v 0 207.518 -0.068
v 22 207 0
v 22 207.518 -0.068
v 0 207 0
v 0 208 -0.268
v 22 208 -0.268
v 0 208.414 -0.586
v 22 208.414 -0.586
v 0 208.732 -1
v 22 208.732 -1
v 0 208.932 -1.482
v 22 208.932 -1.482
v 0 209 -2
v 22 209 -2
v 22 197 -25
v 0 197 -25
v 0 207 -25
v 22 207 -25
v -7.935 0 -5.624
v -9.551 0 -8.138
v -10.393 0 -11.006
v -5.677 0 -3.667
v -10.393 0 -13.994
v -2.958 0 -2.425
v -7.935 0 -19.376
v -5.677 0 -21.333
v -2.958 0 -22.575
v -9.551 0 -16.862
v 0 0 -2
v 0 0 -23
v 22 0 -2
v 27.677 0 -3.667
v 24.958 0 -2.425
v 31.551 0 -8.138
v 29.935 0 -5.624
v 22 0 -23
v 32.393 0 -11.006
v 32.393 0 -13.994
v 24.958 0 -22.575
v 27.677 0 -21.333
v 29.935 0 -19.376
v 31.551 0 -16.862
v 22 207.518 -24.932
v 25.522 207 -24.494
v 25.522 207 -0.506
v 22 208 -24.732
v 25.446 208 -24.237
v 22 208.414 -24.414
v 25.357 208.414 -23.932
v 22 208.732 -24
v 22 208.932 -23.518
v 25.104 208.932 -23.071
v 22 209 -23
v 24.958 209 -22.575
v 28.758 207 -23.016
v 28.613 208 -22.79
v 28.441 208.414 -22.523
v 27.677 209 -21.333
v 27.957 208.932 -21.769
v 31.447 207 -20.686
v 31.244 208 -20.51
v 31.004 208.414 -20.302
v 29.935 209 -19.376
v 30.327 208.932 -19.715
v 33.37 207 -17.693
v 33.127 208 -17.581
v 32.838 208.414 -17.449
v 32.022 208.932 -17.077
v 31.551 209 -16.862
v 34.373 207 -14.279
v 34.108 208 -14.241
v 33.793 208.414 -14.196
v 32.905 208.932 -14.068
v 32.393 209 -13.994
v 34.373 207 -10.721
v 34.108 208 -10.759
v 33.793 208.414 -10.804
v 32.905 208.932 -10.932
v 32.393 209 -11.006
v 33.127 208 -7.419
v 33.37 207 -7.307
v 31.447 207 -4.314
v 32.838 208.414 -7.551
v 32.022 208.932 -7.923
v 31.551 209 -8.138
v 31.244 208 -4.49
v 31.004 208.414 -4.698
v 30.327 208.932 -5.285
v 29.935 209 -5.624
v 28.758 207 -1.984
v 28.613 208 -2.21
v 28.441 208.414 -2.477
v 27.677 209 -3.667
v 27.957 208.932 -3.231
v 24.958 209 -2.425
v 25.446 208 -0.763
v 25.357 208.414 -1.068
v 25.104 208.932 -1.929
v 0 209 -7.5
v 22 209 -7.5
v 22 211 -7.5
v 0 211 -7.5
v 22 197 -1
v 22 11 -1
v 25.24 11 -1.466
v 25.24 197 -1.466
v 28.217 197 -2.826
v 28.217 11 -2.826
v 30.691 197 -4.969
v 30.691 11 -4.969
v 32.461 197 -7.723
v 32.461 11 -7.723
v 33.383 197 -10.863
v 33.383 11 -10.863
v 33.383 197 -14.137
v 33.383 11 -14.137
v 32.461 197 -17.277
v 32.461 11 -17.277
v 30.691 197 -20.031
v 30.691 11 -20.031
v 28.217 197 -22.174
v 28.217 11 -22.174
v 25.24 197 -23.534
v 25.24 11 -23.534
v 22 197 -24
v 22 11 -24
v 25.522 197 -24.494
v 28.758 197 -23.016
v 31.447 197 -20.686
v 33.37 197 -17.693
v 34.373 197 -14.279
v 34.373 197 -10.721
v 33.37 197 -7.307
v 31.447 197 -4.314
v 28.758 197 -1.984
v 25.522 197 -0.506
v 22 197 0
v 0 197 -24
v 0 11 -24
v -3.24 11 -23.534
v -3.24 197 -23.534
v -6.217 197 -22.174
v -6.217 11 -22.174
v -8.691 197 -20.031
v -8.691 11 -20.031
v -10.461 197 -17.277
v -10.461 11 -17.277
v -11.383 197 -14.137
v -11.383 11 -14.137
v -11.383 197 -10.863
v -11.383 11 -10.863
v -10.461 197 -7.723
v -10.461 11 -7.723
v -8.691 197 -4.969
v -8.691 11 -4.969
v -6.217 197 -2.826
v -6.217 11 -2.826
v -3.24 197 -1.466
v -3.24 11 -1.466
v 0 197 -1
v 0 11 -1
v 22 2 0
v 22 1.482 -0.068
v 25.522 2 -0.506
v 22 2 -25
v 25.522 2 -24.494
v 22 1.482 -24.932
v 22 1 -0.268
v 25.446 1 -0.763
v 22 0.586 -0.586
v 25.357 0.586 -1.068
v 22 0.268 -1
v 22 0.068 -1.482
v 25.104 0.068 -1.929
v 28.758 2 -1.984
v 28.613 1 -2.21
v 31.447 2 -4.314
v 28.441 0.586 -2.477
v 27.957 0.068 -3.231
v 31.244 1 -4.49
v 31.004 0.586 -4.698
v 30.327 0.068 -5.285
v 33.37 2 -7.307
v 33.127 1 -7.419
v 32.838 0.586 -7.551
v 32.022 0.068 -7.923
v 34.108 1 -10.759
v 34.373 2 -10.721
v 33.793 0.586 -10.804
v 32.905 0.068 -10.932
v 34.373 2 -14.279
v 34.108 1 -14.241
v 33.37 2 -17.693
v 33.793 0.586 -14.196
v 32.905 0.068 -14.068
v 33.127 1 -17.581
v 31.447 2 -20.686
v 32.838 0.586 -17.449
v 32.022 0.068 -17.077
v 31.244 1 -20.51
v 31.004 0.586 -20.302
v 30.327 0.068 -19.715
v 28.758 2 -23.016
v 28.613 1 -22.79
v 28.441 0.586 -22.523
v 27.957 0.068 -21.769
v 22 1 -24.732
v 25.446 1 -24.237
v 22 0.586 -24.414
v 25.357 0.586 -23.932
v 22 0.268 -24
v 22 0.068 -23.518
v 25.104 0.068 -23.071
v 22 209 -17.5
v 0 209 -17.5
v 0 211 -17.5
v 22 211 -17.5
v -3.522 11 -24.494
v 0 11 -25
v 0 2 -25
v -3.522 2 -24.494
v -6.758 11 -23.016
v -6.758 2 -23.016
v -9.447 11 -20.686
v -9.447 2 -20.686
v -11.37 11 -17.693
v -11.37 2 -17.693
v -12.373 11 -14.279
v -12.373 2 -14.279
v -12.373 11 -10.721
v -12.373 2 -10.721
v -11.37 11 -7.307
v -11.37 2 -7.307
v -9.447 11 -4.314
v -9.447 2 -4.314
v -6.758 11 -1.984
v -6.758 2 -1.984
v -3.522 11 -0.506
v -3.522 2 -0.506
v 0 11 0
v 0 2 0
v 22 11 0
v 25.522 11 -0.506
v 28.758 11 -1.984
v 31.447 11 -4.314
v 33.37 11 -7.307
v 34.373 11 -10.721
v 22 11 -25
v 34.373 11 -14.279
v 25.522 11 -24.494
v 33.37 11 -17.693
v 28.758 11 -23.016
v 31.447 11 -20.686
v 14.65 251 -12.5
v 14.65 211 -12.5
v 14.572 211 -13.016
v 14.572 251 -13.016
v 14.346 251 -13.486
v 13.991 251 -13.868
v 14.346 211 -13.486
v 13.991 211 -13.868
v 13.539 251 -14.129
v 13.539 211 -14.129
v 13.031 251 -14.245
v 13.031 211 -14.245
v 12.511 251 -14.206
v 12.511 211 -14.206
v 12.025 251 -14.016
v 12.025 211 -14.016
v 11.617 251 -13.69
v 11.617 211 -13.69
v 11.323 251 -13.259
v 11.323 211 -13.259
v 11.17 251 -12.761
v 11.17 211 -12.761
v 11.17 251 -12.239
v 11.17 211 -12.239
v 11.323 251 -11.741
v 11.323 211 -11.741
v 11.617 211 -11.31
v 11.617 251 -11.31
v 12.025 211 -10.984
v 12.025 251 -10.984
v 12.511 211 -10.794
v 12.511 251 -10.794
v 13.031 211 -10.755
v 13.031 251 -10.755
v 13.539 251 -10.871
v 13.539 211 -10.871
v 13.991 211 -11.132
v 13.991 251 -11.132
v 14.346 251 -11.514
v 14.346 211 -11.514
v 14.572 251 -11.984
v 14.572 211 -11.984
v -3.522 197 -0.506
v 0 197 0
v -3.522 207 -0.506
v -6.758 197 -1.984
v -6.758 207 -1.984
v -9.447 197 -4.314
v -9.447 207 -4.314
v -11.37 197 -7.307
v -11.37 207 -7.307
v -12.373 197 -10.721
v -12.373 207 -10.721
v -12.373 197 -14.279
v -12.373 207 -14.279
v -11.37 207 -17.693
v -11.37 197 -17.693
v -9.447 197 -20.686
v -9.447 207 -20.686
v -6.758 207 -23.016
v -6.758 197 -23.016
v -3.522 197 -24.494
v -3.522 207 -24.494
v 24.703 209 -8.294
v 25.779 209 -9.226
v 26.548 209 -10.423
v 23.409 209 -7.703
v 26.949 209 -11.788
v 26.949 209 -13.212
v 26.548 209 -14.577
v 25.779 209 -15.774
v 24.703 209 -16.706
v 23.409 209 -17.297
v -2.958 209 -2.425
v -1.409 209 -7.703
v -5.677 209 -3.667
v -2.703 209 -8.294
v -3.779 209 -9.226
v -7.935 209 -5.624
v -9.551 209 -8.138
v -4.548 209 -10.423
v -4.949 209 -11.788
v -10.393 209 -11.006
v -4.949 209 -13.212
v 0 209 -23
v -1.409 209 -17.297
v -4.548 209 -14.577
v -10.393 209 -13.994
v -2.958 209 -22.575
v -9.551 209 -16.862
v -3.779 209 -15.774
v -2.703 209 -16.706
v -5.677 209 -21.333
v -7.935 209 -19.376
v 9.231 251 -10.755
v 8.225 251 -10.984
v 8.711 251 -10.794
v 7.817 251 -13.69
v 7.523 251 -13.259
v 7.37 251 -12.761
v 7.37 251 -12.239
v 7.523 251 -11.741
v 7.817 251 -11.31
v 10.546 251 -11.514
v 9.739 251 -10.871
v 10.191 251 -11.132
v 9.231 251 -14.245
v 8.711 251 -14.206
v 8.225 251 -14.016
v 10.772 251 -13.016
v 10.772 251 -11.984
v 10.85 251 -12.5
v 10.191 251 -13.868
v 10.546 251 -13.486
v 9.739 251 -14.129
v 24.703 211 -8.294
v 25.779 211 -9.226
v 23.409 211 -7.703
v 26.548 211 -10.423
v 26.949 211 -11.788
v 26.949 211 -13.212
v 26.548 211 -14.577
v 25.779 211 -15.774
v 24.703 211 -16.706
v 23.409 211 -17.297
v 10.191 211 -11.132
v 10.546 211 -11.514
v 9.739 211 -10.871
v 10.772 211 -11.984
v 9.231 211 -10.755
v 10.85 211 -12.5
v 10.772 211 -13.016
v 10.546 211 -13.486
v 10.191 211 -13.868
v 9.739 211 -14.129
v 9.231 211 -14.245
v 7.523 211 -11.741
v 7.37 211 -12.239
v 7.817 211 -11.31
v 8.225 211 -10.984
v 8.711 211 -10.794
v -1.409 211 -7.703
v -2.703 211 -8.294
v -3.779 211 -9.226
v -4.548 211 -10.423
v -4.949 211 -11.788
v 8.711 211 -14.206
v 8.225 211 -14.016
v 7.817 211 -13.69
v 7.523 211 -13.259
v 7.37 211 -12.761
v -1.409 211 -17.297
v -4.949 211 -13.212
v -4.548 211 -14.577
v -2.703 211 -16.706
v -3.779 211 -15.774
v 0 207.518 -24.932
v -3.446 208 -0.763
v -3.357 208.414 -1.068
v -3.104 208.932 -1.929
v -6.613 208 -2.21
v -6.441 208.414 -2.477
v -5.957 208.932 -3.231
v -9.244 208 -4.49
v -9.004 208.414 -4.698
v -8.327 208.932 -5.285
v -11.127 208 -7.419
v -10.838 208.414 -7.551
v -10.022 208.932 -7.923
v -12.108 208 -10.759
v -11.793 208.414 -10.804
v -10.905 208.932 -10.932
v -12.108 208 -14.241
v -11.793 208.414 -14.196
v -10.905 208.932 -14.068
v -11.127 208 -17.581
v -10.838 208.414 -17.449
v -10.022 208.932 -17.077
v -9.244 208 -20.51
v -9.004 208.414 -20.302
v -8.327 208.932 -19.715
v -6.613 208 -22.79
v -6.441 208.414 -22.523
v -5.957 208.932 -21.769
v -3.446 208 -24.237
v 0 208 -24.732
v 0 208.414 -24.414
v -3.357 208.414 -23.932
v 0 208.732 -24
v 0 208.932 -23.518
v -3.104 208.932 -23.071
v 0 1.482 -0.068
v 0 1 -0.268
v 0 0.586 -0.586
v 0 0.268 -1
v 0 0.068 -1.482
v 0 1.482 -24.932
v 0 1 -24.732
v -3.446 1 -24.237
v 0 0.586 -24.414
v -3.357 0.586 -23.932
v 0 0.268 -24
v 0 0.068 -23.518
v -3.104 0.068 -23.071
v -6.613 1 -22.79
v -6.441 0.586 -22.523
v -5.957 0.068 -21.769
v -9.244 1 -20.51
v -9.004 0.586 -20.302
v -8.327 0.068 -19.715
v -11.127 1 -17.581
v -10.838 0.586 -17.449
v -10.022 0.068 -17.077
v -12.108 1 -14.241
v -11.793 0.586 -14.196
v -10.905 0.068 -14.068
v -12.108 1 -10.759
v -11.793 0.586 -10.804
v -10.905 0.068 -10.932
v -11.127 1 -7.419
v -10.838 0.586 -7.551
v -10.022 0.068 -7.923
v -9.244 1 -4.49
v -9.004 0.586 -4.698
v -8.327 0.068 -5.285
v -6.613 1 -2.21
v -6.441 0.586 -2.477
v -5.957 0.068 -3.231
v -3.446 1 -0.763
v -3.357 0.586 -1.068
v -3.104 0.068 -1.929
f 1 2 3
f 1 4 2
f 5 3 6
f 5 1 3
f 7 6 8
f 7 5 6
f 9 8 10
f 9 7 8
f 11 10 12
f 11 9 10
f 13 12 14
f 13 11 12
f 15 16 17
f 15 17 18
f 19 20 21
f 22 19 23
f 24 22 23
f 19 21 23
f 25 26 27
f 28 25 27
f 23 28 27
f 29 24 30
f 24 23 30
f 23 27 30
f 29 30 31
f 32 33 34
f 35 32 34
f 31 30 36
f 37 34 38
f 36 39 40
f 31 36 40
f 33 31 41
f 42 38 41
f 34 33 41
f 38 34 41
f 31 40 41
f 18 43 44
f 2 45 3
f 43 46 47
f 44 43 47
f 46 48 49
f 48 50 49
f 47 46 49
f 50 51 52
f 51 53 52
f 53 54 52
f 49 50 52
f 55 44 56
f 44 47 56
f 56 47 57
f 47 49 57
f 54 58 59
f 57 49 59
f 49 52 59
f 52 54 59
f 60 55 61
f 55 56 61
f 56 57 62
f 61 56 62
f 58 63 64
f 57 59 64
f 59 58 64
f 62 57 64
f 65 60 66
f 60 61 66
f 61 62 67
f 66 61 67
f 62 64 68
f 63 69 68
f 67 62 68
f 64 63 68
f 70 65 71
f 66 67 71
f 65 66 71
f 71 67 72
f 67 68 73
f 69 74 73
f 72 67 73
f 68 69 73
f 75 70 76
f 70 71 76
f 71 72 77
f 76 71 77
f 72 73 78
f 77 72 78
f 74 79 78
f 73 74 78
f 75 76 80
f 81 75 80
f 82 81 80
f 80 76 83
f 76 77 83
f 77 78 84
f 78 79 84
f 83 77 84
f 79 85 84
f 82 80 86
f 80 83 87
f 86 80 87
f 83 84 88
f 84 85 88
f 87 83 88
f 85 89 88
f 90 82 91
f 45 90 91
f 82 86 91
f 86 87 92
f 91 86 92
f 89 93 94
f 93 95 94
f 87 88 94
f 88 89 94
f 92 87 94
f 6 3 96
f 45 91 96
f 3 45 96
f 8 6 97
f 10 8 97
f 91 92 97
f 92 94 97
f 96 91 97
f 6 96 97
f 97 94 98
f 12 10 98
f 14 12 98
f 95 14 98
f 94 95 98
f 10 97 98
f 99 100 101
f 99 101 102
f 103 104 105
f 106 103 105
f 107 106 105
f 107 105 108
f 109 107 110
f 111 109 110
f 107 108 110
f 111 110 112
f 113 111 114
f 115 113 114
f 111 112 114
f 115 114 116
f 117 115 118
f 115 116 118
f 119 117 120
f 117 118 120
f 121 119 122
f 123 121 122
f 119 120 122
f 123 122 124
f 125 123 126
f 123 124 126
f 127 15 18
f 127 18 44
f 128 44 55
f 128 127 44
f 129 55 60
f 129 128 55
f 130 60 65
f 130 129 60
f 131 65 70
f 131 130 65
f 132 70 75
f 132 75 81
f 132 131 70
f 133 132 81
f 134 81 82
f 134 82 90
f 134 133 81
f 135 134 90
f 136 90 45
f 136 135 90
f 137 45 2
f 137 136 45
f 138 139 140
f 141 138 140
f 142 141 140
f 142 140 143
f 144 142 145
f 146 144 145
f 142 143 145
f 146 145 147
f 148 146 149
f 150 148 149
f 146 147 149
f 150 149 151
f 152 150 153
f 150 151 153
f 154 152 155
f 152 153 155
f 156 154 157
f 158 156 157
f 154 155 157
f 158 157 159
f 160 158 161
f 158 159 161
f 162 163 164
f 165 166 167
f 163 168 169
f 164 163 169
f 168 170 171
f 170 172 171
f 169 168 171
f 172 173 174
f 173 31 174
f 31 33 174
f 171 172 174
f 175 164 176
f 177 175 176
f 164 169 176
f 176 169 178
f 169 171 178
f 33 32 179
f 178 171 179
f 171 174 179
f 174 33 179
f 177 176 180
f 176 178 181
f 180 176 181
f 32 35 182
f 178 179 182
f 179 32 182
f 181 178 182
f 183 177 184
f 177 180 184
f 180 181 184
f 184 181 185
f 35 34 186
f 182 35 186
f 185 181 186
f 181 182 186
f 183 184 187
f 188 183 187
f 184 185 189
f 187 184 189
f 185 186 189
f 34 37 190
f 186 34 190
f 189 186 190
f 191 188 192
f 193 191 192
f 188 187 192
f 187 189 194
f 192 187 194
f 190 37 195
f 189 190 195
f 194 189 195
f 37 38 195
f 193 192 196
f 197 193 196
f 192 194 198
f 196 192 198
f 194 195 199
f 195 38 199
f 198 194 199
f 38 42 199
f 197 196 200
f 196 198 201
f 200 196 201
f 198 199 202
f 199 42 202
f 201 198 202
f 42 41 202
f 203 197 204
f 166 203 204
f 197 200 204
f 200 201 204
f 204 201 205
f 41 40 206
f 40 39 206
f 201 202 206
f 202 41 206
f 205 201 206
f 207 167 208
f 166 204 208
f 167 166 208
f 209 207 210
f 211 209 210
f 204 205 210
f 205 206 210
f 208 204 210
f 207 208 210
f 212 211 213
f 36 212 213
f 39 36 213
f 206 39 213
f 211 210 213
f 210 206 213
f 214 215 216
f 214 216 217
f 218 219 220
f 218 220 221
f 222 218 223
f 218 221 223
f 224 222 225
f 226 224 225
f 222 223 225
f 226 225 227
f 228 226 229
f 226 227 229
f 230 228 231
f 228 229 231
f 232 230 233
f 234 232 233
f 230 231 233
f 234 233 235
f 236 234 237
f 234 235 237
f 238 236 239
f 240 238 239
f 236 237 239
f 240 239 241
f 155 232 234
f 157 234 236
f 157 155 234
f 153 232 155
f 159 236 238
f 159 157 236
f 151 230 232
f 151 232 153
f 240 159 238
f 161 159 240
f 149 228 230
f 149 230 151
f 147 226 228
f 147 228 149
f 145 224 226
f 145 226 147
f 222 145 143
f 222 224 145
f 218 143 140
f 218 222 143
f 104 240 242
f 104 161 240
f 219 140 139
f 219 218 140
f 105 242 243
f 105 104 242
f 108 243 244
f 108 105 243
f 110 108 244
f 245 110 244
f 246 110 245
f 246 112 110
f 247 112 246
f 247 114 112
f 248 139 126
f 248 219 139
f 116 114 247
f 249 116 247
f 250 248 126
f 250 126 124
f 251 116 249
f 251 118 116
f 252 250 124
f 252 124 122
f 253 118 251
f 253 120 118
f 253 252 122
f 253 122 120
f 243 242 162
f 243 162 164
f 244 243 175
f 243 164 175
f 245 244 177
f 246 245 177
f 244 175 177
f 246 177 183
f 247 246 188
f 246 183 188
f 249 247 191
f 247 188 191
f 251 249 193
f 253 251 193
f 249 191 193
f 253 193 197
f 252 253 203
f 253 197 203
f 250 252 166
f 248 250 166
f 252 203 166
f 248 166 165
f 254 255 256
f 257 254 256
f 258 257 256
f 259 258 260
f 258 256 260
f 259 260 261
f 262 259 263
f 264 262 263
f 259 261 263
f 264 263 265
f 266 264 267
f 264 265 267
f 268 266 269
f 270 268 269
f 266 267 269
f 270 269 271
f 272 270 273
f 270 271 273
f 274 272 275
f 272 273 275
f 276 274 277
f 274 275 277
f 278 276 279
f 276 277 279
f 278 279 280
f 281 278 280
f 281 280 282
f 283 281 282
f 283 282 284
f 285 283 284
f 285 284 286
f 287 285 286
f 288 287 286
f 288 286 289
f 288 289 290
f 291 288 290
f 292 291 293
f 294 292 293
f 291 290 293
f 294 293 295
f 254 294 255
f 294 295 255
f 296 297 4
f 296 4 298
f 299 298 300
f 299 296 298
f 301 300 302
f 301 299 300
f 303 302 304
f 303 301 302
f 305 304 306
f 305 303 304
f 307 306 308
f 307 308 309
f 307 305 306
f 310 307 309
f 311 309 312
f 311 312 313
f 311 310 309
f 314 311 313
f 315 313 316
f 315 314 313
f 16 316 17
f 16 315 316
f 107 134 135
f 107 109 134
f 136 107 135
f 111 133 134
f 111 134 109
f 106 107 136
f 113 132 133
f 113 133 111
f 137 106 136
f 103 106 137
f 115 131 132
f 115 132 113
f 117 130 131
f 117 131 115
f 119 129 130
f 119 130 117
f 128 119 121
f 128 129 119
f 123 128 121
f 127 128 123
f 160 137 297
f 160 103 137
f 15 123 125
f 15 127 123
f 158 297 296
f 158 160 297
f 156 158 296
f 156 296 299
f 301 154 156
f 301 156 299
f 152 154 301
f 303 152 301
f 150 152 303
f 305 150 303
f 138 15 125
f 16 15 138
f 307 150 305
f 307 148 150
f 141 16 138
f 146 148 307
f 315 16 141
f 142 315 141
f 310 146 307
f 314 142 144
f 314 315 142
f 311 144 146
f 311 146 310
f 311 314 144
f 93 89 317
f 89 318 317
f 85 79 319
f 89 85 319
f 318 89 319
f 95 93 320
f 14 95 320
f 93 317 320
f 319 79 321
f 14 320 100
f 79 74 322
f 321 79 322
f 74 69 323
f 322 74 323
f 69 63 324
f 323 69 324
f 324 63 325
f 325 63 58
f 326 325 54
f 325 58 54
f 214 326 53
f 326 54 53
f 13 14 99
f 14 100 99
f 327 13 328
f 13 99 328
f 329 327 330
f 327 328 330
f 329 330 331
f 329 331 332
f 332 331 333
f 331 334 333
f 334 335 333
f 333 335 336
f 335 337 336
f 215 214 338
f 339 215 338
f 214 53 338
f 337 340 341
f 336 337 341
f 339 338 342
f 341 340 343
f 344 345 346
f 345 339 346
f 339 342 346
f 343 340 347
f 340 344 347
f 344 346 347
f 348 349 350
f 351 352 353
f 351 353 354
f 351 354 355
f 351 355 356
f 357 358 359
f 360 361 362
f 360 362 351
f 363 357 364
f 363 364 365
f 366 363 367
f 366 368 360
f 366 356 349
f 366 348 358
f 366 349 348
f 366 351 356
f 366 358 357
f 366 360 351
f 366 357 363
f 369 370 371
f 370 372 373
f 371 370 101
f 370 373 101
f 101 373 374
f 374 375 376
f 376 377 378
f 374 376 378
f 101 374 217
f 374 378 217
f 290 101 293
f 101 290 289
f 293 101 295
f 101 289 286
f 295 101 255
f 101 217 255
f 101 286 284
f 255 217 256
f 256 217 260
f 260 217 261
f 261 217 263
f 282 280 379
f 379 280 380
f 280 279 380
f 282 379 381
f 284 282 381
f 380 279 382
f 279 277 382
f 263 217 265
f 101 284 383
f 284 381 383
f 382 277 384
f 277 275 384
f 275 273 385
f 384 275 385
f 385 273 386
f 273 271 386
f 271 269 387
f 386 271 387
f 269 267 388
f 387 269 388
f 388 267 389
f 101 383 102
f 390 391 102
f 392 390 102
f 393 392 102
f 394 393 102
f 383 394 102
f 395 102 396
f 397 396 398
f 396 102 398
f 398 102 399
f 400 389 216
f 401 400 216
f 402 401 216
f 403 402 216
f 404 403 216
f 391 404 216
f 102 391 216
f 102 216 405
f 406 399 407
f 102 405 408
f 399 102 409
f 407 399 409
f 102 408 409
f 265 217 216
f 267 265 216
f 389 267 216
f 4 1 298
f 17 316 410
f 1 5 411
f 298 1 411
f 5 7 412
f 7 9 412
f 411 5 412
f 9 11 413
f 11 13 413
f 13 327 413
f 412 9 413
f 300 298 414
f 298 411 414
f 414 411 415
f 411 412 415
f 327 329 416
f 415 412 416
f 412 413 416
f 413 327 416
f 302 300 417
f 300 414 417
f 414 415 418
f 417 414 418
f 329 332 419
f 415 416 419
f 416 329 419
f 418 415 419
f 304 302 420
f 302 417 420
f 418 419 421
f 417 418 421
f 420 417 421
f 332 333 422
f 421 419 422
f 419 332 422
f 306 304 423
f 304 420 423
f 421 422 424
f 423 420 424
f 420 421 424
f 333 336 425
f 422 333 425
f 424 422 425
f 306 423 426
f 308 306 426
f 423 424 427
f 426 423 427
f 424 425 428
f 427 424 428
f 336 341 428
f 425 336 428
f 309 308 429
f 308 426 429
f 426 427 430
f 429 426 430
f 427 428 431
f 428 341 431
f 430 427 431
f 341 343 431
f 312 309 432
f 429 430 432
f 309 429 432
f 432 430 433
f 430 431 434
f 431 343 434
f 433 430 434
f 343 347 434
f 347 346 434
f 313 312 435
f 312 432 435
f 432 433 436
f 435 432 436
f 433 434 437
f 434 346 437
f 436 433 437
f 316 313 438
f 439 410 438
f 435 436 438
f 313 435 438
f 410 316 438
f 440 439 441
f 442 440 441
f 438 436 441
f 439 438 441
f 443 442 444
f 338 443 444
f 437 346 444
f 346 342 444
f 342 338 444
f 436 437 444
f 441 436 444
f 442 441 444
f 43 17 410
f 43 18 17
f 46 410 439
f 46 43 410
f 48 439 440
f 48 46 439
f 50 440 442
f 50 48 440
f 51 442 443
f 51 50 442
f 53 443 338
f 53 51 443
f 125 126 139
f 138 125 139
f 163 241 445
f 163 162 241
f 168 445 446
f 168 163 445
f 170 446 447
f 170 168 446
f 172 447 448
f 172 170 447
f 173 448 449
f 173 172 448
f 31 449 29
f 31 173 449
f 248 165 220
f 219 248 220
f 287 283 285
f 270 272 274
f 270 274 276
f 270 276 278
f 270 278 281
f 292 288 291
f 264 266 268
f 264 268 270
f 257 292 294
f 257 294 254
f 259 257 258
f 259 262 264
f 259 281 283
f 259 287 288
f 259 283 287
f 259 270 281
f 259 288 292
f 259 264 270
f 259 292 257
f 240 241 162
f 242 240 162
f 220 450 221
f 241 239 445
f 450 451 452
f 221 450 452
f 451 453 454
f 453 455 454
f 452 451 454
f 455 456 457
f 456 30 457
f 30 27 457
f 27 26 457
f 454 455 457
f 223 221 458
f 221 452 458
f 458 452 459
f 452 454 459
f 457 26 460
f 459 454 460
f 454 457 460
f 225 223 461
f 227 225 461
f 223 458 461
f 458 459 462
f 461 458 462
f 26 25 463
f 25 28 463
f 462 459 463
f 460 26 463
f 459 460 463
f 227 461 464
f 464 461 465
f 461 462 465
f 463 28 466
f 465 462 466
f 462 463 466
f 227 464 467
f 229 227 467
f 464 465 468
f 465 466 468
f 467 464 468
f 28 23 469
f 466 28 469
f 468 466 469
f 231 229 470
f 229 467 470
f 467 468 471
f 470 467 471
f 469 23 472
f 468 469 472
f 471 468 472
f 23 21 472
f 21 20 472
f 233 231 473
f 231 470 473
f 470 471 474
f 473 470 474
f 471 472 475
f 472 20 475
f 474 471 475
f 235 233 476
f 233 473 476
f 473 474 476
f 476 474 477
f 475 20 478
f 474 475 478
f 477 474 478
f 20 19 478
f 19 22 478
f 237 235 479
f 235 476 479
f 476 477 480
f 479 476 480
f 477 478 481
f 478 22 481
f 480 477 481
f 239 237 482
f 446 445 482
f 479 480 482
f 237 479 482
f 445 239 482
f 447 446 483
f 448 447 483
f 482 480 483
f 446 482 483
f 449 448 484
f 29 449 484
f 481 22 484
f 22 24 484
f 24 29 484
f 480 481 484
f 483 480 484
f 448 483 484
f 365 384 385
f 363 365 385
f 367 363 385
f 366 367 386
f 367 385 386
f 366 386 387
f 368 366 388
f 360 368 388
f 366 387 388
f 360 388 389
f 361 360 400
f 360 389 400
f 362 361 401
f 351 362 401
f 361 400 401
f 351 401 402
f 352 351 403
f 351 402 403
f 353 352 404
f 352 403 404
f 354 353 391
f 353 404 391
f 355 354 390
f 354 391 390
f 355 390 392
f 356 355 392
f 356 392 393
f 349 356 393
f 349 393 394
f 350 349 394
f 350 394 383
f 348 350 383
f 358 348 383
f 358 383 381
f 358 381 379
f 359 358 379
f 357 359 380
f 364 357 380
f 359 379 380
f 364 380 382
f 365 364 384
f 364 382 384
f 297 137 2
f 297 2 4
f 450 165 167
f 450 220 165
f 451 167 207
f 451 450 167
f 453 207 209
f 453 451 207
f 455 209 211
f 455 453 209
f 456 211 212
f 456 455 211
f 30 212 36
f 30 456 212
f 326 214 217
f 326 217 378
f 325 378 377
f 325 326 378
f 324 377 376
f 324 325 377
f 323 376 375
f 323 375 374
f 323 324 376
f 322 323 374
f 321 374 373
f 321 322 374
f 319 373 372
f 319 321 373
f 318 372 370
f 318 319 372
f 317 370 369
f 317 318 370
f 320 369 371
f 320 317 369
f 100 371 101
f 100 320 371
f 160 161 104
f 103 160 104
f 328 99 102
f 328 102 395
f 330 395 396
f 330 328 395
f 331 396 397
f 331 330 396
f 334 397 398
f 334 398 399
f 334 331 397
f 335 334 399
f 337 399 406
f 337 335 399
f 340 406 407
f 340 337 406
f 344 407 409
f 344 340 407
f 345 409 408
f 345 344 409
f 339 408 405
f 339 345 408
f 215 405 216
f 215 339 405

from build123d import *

# Parameters (mm, degrees)
EXTRUSION1_DEPTH = 11
EXTRUSION3_DEPTH = 186
EXTRUSION4_DEPTH = 12
EXTRUSION5_DEPTH = 2
CONG_1_R         = 2
ESQUISSE6_R      = 1.75
EXTRUSION6_DEPTH = 40


with BuildPart() as part:
    # Esquisse1 → Extrusion1 (new body)
    with BuildSketch(Plane(origin=(0, 0, 0), x_dir=(1, 0, 0), z_dir=(0, 1, 0))):
        with BuildLine():
            Line((0, 0), (22, 0))
            ThreePointArc((22, 0), (34.5, 12.5), (22, 25))
            Line((22, 25), (0, 25))
            ThreePointArc((0, 25), (-12.5, 12.5), (0, 0))
        make_face()
    extrude(amount=EXTRUSION1_DEPTH)

    # Esquisse3 → Extrusion3 (add)
    with BuildSketch(Plane(origin=(0, 11, 0), x_dir=(1, 0, 0), z_dir=(0, 1, 0))):
        with BuildLine():
            Line((0, 1), (22, 1))
            ThreePointArc((22, 1), (33.5, 12.5), (22, 24))
            Line((22, 24), (0, 24))
            ThreePointArc((0, 24), (-11.5, 12.5), (0, 1))
        make_face()
    extrude(amount=EXTRUSION3_DEPTH)

    # Esquisse4 → Extrusion4 (add)
    with BuildSketch(Plane(origin=(0, 197, 0), x_dir=(1, 0, 0), z_dir=(0, 1, 0))):
        with BuildLine():
            Line((0, 25), (22, 25))
            ThreePointArc((22, 25), (34.5, 12.5), (22, 0))
            Line((22, 0), (0, 0))
            ThreePointArc((0, 0), (-12.5, 12.5), (0, 25))
        make_face()
    extrude(amount=EXTRUSION4_DEPTH)

    # Esquisse5 → Extrusion5 (add)
    with BuildSketch(Plane(origin=(0, 209, 0), x_dir=(1, 0, 0), z_dir=(0, 1, 0))):
        with BuildLine():
            Line((0, 17.5), (22, 17.5))
            ThreePointArc((22, 17.5), (27, 12.5), (22, 7.5))
            Line((22, 7.5), (0, 7.5))
            ThreePointArc((0, 7.5), (-5, 12.5), (0, 17.5))
        make_face()
    extrude(amount=EXTRUSION5_DEPTH)

    # Congé1
    cong_1_edges = [part.edges().sort_by_distance(p)[0] for p in [
        (-12.5, 209, -12.5),
        (11, 209, 0),
        (34.5, 209, -12.5),
        (11, 209, -25),
        (11, 0, -25),
        (34.5, 0, -12.5),
        (11, 0, 0),
        (-12.5, 0, -12.5),
    ]]
    fillet(cong_1_edges, radius=CONG_1_R)

    # Esquisse6 → Extrusion6 (add)
    with BuildSketch(Plane(origin=(0, 211, 0), x_dir=(1, 0, 0), z_dir=(0, 1, 0))):
        with Locations((9.1, 12.5)):
            Circle(ESQUISSE6_R)
        with Locations((12.9, 12.5)):
            Circle(ESQUISSE6_R)
    extrude(amount=EXTRUSION6_DEPTH)


solid = part.part
